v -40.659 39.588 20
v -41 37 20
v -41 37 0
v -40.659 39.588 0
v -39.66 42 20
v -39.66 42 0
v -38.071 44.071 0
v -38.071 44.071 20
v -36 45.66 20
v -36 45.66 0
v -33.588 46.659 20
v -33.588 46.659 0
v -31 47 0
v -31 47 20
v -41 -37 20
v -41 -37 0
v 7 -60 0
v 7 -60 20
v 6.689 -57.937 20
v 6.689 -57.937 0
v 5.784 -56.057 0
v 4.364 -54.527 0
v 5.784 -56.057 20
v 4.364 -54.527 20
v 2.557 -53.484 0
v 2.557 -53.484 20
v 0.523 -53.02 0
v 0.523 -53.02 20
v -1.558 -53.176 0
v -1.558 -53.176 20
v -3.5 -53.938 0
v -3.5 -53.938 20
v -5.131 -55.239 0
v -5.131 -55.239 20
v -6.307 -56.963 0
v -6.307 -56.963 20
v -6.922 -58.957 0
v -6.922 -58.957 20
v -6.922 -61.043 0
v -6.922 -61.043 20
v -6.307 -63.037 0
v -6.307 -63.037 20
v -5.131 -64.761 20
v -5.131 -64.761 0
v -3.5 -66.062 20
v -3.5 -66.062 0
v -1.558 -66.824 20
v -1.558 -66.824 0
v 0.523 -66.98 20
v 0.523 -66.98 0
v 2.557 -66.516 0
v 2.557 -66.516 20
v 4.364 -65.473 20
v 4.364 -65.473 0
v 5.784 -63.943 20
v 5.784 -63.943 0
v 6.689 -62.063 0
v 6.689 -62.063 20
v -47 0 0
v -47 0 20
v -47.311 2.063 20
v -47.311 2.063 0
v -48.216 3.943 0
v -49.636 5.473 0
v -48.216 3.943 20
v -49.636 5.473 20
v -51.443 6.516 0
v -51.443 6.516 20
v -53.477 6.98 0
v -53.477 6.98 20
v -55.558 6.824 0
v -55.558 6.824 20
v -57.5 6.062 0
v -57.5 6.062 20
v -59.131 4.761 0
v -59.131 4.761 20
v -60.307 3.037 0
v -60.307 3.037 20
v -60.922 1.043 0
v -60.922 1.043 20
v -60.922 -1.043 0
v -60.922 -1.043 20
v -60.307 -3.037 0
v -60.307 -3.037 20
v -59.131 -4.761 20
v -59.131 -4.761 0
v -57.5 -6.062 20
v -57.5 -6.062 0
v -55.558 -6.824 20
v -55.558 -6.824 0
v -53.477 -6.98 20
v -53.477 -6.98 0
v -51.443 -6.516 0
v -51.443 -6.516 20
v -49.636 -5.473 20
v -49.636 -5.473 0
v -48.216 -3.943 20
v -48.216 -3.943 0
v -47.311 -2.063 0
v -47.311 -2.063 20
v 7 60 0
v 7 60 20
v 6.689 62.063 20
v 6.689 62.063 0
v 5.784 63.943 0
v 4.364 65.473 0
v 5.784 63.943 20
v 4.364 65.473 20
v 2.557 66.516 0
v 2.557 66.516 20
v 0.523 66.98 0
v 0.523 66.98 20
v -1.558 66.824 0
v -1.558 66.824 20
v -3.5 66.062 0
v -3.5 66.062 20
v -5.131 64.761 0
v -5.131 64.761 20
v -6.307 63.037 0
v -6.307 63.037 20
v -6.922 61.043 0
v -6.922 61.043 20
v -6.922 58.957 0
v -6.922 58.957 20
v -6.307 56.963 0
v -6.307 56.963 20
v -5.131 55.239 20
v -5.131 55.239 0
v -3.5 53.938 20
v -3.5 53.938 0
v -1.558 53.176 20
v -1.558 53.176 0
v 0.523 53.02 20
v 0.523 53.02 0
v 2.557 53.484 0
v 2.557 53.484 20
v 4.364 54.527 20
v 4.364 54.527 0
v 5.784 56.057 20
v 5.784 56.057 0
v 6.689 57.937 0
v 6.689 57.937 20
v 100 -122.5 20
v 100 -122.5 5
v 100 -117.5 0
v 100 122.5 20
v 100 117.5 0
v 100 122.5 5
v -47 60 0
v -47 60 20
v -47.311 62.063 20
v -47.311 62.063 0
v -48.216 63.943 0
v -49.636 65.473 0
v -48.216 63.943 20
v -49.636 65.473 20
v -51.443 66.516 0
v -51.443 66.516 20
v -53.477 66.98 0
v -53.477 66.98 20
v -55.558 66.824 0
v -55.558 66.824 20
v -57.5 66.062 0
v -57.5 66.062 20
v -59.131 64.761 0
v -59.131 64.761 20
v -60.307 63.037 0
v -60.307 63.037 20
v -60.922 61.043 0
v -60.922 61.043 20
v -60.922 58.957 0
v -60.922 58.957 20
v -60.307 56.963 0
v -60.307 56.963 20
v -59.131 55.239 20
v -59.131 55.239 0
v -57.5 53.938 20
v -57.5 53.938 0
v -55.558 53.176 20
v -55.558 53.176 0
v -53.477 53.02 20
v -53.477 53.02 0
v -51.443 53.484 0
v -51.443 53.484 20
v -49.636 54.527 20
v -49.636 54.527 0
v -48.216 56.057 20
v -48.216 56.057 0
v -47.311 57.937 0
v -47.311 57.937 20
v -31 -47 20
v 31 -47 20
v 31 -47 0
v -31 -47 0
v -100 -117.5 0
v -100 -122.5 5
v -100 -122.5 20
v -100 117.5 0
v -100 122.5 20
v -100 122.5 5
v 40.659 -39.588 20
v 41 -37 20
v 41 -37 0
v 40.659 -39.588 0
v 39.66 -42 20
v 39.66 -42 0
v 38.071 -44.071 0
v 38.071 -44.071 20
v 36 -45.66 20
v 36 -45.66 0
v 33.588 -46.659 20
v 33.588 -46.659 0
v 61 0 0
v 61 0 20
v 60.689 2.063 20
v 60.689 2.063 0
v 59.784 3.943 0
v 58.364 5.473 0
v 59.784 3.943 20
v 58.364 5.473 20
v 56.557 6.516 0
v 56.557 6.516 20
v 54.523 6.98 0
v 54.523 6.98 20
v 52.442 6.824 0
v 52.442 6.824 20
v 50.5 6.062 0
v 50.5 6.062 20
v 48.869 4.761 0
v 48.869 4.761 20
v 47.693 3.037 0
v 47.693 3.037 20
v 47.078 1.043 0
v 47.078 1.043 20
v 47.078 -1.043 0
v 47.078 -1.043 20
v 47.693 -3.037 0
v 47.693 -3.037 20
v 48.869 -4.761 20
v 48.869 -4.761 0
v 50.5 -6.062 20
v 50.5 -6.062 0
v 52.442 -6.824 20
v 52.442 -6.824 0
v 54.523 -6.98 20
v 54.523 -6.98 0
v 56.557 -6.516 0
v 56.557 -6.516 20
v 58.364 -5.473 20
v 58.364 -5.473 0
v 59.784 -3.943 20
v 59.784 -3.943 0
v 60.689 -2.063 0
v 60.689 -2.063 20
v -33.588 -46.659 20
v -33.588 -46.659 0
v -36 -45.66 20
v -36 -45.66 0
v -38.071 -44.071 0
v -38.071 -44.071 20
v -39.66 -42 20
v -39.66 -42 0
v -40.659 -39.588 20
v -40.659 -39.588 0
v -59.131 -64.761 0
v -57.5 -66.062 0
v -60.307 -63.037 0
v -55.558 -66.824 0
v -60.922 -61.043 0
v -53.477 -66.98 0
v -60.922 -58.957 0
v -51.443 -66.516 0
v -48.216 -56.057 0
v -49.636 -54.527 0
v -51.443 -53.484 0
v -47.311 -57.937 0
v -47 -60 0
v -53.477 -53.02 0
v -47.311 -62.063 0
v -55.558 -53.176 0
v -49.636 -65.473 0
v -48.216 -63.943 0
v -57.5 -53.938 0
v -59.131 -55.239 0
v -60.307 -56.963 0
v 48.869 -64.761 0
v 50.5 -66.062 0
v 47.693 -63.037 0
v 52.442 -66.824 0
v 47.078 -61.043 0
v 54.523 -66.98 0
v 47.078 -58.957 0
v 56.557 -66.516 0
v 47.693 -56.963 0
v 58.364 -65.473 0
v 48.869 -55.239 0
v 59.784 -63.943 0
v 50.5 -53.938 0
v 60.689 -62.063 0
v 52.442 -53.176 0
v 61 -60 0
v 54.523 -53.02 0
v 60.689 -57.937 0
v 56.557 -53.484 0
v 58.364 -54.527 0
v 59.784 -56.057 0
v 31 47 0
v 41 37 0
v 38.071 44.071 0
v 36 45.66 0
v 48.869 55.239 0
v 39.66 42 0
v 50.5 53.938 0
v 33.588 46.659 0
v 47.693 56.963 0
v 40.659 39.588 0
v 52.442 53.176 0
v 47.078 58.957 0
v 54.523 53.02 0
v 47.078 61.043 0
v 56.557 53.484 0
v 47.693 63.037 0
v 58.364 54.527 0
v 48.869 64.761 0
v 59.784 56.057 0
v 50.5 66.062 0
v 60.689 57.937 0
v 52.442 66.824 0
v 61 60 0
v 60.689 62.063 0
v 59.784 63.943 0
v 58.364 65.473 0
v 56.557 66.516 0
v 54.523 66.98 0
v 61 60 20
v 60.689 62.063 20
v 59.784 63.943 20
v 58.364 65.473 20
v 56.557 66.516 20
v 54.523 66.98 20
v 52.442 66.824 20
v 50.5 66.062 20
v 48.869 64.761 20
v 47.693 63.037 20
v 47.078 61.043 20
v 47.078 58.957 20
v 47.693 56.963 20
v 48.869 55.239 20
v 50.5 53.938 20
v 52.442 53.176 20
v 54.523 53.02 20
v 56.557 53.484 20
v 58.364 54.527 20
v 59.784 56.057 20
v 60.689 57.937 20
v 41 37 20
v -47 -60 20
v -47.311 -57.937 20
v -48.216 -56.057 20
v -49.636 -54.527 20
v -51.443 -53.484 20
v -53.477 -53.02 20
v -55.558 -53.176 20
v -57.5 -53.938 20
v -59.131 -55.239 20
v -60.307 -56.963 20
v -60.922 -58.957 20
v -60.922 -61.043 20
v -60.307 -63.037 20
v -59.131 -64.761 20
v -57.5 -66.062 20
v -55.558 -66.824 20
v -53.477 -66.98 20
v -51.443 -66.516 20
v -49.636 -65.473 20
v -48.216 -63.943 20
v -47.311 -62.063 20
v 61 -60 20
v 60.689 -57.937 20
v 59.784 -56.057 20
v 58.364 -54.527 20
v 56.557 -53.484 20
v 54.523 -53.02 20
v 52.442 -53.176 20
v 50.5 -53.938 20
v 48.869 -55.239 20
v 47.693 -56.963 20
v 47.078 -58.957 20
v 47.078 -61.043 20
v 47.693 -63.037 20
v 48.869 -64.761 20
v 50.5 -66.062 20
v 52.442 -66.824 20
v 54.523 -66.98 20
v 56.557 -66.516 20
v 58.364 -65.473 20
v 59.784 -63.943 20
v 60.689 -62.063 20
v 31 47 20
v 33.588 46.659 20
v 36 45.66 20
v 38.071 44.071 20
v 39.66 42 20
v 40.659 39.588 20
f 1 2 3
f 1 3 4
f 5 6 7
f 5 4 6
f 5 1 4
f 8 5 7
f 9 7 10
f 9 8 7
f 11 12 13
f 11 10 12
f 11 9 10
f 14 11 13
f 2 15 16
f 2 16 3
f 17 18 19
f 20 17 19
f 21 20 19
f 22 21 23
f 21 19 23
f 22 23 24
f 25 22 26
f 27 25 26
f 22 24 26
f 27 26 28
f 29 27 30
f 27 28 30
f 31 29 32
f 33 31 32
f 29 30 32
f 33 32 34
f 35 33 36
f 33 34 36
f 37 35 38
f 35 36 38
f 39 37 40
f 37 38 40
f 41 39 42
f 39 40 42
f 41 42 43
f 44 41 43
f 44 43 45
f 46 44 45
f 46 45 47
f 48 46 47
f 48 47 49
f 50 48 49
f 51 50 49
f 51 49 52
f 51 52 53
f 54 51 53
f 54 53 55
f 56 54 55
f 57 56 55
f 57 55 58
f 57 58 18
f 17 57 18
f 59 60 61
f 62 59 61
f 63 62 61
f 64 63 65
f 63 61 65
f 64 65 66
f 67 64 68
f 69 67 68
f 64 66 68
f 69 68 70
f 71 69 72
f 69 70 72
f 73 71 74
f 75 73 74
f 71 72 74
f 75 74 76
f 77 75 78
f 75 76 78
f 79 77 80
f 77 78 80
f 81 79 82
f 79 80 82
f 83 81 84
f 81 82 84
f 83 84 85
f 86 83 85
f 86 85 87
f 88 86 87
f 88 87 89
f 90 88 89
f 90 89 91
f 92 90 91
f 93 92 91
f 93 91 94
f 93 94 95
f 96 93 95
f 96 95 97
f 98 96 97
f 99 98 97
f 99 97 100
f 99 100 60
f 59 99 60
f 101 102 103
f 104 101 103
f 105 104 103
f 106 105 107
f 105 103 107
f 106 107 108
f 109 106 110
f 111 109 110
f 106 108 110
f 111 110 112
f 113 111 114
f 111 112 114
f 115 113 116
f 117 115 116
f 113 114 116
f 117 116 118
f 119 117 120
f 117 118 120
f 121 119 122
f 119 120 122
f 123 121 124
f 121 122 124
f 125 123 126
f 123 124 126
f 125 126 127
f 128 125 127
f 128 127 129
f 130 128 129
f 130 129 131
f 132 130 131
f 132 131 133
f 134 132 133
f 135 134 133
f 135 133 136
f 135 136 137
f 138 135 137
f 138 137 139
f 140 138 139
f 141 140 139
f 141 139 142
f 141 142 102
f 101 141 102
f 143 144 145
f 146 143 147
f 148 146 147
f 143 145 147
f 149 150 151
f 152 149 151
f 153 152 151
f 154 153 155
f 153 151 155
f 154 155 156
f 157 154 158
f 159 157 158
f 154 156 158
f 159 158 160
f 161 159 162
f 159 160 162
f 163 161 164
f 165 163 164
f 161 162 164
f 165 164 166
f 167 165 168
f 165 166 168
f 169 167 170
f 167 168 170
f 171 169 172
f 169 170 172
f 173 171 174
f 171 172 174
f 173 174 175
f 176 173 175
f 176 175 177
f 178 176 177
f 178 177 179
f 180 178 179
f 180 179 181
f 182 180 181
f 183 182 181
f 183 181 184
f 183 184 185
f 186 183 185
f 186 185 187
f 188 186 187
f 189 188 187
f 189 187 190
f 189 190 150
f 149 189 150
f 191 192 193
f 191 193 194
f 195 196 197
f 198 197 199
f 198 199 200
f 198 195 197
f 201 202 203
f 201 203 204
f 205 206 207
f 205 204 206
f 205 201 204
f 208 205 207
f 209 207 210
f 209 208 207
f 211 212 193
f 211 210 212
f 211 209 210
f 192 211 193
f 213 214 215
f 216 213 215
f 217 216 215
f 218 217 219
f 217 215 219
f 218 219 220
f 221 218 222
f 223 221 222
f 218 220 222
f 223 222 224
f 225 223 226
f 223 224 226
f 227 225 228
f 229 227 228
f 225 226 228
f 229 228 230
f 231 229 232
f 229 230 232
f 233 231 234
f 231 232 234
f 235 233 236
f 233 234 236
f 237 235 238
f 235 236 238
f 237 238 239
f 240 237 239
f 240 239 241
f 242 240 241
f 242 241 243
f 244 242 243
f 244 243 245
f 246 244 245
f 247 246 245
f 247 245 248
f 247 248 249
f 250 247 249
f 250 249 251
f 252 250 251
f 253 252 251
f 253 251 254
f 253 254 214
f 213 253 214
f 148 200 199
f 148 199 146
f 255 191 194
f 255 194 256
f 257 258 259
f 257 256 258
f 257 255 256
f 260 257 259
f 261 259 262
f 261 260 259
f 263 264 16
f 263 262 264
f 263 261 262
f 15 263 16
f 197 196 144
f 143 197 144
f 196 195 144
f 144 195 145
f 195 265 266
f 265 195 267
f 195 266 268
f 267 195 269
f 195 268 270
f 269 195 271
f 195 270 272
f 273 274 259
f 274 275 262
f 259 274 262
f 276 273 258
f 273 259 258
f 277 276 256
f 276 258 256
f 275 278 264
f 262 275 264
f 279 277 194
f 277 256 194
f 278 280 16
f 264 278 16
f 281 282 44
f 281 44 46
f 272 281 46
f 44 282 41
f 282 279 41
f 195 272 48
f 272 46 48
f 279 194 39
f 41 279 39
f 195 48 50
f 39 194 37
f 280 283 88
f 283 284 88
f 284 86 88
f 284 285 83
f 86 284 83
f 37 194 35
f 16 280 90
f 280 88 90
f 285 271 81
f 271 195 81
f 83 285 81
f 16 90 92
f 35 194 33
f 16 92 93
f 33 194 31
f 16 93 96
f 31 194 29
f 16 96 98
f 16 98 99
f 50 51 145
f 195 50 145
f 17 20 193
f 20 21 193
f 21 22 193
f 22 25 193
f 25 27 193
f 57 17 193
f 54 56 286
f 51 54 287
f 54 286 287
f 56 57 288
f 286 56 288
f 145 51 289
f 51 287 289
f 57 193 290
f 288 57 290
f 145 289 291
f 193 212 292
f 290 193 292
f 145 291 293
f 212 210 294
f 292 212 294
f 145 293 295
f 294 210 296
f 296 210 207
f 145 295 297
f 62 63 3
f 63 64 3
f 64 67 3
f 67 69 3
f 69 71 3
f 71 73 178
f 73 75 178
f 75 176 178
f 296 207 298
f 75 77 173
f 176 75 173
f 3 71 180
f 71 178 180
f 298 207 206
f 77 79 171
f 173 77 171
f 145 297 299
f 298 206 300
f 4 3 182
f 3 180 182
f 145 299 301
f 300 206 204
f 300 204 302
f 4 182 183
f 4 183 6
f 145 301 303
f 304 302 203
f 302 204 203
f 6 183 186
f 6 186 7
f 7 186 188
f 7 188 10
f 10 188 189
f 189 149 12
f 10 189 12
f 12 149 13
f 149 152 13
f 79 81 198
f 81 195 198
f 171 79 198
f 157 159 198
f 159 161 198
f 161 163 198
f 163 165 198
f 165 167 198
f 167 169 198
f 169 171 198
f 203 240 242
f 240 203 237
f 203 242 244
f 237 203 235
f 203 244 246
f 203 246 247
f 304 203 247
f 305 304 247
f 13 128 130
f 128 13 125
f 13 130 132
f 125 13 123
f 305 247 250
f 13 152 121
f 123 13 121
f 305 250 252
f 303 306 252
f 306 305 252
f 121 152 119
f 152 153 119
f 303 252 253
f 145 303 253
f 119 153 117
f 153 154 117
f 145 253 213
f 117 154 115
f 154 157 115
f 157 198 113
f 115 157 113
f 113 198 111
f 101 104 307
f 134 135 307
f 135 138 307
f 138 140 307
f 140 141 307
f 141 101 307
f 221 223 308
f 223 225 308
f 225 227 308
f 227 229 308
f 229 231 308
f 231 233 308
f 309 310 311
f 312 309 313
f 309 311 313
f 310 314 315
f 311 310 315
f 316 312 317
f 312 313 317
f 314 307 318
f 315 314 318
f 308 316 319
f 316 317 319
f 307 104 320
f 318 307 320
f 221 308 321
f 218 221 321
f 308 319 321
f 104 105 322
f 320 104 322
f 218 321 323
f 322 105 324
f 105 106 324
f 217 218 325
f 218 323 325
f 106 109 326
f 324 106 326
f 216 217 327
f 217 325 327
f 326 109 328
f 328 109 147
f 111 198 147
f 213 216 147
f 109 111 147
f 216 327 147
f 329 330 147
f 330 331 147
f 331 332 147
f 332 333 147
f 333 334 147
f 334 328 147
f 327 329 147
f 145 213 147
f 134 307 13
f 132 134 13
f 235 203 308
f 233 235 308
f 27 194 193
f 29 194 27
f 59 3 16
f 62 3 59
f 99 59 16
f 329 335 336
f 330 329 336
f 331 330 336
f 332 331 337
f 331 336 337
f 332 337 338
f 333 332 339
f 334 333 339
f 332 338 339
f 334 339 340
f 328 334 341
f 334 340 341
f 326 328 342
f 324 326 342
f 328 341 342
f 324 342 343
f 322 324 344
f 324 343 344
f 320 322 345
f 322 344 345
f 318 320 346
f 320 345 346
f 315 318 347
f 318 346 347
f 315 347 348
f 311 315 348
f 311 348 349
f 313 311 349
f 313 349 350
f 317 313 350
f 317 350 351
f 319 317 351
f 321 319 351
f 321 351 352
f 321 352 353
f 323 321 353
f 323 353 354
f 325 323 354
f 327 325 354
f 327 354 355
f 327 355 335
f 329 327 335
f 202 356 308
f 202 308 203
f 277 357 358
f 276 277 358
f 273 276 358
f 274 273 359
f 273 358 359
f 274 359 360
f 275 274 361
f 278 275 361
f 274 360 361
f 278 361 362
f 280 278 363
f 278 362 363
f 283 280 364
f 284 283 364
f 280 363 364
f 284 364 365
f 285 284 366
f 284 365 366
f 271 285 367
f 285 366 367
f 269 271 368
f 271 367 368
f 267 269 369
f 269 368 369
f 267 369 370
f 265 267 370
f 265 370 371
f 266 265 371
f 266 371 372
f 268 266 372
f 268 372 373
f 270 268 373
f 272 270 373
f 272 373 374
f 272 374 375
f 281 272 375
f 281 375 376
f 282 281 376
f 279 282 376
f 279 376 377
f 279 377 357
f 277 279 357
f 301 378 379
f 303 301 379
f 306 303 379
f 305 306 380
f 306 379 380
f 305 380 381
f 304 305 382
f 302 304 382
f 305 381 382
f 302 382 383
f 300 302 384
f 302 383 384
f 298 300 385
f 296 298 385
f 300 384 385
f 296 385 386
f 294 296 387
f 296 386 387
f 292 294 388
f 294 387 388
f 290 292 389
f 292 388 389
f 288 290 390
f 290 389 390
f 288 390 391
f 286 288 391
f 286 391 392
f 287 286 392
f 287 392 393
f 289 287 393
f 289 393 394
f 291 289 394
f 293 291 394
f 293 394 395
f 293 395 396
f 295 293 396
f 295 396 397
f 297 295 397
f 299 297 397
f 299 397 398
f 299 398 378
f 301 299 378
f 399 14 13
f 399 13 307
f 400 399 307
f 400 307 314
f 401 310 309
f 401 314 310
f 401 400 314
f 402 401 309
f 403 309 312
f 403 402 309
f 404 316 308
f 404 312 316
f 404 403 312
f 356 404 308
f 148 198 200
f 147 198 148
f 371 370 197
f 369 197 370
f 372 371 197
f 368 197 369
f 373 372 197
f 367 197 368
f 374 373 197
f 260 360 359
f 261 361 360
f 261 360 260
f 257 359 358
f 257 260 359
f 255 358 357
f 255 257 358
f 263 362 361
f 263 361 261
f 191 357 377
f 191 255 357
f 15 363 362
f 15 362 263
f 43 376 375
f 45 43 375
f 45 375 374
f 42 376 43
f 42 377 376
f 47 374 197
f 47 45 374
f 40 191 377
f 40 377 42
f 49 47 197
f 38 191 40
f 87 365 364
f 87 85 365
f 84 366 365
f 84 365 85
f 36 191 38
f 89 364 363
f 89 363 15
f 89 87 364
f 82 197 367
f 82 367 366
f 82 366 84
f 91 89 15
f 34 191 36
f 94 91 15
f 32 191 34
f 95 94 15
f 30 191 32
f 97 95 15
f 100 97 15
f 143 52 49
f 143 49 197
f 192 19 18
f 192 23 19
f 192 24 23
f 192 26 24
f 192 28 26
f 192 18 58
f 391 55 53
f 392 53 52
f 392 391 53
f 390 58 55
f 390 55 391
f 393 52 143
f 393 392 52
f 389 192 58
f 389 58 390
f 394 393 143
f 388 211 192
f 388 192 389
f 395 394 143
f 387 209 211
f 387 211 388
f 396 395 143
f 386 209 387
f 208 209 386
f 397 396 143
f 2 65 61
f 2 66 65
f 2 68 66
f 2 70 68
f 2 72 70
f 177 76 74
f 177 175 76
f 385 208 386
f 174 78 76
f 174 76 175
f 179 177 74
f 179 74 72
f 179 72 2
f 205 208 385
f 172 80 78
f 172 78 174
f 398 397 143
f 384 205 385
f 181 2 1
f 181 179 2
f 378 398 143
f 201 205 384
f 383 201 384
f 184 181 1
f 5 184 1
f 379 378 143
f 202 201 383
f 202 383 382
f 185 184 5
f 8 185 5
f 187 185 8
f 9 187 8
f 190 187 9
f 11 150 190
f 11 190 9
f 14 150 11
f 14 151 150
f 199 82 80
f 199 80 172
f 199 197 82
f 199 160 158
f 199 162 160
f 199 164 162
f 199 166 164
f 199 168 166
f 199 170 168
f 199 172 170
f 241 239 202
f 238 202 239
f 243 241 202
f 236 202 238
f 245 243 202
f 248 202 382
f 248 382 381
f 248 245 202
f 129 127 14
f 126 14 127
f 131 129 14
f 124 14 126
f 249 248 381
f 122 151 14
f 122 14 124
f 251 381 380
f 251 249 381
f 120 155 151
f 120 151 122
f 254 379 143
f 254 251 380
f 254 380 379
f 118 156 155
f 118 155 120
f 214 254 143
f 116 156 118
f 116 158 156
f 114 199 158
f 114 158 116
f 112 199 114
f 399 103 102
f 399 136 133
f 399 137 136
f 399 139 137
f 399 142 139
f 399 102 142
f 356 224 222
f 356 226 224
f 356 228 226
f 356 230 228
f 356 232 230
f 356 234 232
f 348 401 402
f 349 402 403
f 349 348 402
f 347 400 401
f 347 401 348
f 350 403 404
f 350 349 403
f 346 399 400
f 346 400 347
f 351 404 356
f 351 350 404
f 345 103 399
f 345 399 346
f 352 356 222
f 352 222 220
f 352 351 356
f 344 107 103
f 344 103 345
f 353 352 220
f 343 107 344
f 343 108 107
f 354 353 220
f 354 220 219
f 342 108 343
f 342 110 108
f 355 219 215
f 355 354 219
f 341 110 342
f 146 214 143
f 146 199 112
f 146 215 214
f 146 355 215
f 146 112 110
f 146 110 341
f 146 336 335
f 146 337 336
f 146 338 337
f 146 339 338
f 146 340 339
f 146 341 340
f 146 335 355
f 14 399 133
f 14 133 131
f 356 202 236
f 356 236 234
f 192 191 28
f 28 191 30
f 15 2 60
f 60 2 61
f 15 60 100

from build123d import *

# Parameters (mm, degrees)
SKETCH_1_W          = 200
SKETCH_1_H          = 245
EXTRUDE_1_DEPTH     = 20
CUT_EXTRUDE_1_REACH = 161.393
SKETCH_2_R          = 7
CHAMFER_1_SIZE      = 5


with BuildPart() as part:
    # 草图1 → 凸台-拉伸1 (new body)
    with BuildSketch(Plane.XY):
        Rectangle(SKETCH_1_W, SKETCH_1_H)
    extrude(amount=EXTRUDE_1_DEPTH)

    # 草图2 → 切除-拉伸1 (cut, up to next)
    with BuildSketch(Plane.XY.offset(20), mode=Mode.PRIVATE) as cut_extrude_1_sk1:
        with Locations((-54, 60)):
            Circle(SKETCH_2_R)
    cut_extrude_1_tool1 = extrude(cut_extrude_1_sk1.sketch, amount=-CUT_EXTRUDE_1_REACH, mode=Mode.PRIVATE) & part.part
    # 草图2 → 切除-拉伸1 (cut, up to next)
    with BuildSketch(Plane.XY.offset(20), mode=Mode.PRIVATE) as cut_extrude_1_sk2:
        with Locations((0, 60)):
            Circle(SKETCH_2_R)
    cut_extrude_1_tool2 = extrude(cut_extrude_1_sk2.sketch, amount=-CUT_EXTRUDE_1_REACH, mode=Mode.PRIVATE) & part.part
    # 草图2 → 切除-拉伸1 (cut, up to next)
    with BuildSketch(Plane.XY.offset(20), mode=Mode.PRIVATE) as cut_extrude_1_sk3:
        with Locations((54, 60)):
            Circle(SKETCH_2_R)
    cut_extrude_1_tool3 = extrude(cut_extrude_1_sk3.sketch, amount=-CUT_EXTRUDE_1_REACH, mode=Mode.PRIVATE) & part.part
    # 草图2 → 切除-拉伸1 (cut, up to next)
    with BuildSketch(Plane.XY.offset(20), mode=Mode.PRIVATE) as cut_extrude_1_sk4:
        with Locations((-54, 0)):
            Circle(SKETCH_2_R)
    cut_extrude_1_tool4 = extrude(cut_extrude_1_sk4.sketch, amount=-CUT_EXTRUDE_1_REACH, mode=Mode.PRIVATE) & part.part
    # 草图2 → 切除-拉伸1 (cut, up to next)
    with BuildSketch(Plane.XY.offset(20), mode=Mode.PRIVATE) as cut_extrude_1_sk5:
        with Locations((54, 0)):
            Circle(SKETCH_2_R)
    cut_extrude_1_tool5 = extrude(cut_extrude_1_sk5.sketch, amount=-CUT_EXTRUDE_1_REACH, mode=Mode.PRIVATE) & part.part
    # 草图2 → 切除-拉伸1 (cut, up to next)
    with BuildSketch(Plane.XY.offset(20), mode=Mode.PRIVATE) as cut_extrude_1_sk6:
        with Locations((-54, -60)):
            Circle(SKETCH_2_R)
    cut_extrude_1_tool6 = extrude(cut_extrude_1_sk6.sketch, amount=-CUT_EXTRUDE_1_REACH, mode=Mode.PRIVATE) & part.part
    # 草图2 → 切除-拉伸1 (cut, up to next)
    with BuildSketch(Plane.XY.offset(20), mode=Mode.PRIVATE) as cut_extrude_1_sk7:
        with Locations((0, -60)):
            Circle(SKETCH_2_R)
    cut_extrude_1_tool7 = extrude(cut_extrude_1_sk7.sketch, amount=-CUT_EXTRUDE_1_REACH, mode=Mode.PRIVATE) & part.part
    # 草图2 → 切除-拉伸1 (cut, up to next)
    with BuildSketch(Plane.XY.offset(20), mode=Mode.PRIVATE) as cut_extrude_1_sk8:
        with Locations((54, -60)):
            Circle(SKETCH_2_R)
    cut_extrude_1_tool8 = extrude(cut_extrude_1_sk8.sketch, amount=-CUT_EXTRUDE_1_REACH, mode=Mode.PRIVATE) & part.part
    # 草图2 → 切除-拉伸1 (cut, up to next)
    with BuildSketch(Plane.XY.offset(20), mode=Mode.PRIVATE) as cut_extrude_1_sk9:
        with BuildLine():
            Line((-31, 47), (31, 47))
            ThreePointArc((31, 47), (38.071067812, 44.071067812), (41, 37))
            Line((41, 37), (41, -37))
            ThreePointArc((41, -37), (38.071067812, -44.071067812), (31, -47))
            Line((31, -47), (-31, -47))
            ThreePointArc((-31, -47), (-38.071067812, -44.071067812), (-41, -37))
            Line((-41, -37), (-41, 37))
            ThreePointArc((-41, 37), (-38.071067812, 44.071067812), (-31, 47))
        make_face()
    cut_extrude_1_tool9 = extrude(cut_extrude_1_sk9.sketch, amount=-CUT_EXTRUDE_1_REACH, mode=Mode.PRIVATE) & part.part
    add(cut_extrude_1_tool1.solids().sort_by_distance((-54, 60, 20))[0], mode=Mode.SUBTRACT)
    add(cut_extrude_1_tool2.solids().sort_by_distance((0, 60, 20))[0], mode=Mode.SUBTRACT)
    add(cut_extrude_1_tool3.solids().sort_by_distance((54, 60, 20))[0], mode=Mode.SUBTRACT)
    add(cut_extrude_1_tool4.solids().sort_by_distance((-54, 0, 20))[0], mode=Mode.SUBTRACT)
    add(cut_extrude_1_tool5.solids().sort_by_distance((54, 0, 20))[0], mode=Mode.SUBTRACT)
    add(cut_extrude_1_tool6.solids().sort_by_distance((-54, -60, 20))[0], mode=Mode.SUBTRACT)
    add(cut_extrude_1_tool7.solids().sort_by_distance((0, -60, 20))[0], mode=Mode.SUBTRACT)
    add(cut_extrude_1_tool8.solids().sort_by_distance((54, -60, 20))[0], mode=Mode.SUBTRACT)
    add(cut_extrude_1_tool9.solids().sort_by_distance((0, 0, 20))[0], mode=Mode.SUBTRACT)

    # 倒角1
    chamfer_1_edges = [part.edges().sort_by_distance(p)[0] for p in [
        (0, -122.5, 0),
        (0, 122.5, 0),
    ]]
    chamfer(chamfer_1_edges, length=CHAMFER_1_SIZE)


solid = part.part
